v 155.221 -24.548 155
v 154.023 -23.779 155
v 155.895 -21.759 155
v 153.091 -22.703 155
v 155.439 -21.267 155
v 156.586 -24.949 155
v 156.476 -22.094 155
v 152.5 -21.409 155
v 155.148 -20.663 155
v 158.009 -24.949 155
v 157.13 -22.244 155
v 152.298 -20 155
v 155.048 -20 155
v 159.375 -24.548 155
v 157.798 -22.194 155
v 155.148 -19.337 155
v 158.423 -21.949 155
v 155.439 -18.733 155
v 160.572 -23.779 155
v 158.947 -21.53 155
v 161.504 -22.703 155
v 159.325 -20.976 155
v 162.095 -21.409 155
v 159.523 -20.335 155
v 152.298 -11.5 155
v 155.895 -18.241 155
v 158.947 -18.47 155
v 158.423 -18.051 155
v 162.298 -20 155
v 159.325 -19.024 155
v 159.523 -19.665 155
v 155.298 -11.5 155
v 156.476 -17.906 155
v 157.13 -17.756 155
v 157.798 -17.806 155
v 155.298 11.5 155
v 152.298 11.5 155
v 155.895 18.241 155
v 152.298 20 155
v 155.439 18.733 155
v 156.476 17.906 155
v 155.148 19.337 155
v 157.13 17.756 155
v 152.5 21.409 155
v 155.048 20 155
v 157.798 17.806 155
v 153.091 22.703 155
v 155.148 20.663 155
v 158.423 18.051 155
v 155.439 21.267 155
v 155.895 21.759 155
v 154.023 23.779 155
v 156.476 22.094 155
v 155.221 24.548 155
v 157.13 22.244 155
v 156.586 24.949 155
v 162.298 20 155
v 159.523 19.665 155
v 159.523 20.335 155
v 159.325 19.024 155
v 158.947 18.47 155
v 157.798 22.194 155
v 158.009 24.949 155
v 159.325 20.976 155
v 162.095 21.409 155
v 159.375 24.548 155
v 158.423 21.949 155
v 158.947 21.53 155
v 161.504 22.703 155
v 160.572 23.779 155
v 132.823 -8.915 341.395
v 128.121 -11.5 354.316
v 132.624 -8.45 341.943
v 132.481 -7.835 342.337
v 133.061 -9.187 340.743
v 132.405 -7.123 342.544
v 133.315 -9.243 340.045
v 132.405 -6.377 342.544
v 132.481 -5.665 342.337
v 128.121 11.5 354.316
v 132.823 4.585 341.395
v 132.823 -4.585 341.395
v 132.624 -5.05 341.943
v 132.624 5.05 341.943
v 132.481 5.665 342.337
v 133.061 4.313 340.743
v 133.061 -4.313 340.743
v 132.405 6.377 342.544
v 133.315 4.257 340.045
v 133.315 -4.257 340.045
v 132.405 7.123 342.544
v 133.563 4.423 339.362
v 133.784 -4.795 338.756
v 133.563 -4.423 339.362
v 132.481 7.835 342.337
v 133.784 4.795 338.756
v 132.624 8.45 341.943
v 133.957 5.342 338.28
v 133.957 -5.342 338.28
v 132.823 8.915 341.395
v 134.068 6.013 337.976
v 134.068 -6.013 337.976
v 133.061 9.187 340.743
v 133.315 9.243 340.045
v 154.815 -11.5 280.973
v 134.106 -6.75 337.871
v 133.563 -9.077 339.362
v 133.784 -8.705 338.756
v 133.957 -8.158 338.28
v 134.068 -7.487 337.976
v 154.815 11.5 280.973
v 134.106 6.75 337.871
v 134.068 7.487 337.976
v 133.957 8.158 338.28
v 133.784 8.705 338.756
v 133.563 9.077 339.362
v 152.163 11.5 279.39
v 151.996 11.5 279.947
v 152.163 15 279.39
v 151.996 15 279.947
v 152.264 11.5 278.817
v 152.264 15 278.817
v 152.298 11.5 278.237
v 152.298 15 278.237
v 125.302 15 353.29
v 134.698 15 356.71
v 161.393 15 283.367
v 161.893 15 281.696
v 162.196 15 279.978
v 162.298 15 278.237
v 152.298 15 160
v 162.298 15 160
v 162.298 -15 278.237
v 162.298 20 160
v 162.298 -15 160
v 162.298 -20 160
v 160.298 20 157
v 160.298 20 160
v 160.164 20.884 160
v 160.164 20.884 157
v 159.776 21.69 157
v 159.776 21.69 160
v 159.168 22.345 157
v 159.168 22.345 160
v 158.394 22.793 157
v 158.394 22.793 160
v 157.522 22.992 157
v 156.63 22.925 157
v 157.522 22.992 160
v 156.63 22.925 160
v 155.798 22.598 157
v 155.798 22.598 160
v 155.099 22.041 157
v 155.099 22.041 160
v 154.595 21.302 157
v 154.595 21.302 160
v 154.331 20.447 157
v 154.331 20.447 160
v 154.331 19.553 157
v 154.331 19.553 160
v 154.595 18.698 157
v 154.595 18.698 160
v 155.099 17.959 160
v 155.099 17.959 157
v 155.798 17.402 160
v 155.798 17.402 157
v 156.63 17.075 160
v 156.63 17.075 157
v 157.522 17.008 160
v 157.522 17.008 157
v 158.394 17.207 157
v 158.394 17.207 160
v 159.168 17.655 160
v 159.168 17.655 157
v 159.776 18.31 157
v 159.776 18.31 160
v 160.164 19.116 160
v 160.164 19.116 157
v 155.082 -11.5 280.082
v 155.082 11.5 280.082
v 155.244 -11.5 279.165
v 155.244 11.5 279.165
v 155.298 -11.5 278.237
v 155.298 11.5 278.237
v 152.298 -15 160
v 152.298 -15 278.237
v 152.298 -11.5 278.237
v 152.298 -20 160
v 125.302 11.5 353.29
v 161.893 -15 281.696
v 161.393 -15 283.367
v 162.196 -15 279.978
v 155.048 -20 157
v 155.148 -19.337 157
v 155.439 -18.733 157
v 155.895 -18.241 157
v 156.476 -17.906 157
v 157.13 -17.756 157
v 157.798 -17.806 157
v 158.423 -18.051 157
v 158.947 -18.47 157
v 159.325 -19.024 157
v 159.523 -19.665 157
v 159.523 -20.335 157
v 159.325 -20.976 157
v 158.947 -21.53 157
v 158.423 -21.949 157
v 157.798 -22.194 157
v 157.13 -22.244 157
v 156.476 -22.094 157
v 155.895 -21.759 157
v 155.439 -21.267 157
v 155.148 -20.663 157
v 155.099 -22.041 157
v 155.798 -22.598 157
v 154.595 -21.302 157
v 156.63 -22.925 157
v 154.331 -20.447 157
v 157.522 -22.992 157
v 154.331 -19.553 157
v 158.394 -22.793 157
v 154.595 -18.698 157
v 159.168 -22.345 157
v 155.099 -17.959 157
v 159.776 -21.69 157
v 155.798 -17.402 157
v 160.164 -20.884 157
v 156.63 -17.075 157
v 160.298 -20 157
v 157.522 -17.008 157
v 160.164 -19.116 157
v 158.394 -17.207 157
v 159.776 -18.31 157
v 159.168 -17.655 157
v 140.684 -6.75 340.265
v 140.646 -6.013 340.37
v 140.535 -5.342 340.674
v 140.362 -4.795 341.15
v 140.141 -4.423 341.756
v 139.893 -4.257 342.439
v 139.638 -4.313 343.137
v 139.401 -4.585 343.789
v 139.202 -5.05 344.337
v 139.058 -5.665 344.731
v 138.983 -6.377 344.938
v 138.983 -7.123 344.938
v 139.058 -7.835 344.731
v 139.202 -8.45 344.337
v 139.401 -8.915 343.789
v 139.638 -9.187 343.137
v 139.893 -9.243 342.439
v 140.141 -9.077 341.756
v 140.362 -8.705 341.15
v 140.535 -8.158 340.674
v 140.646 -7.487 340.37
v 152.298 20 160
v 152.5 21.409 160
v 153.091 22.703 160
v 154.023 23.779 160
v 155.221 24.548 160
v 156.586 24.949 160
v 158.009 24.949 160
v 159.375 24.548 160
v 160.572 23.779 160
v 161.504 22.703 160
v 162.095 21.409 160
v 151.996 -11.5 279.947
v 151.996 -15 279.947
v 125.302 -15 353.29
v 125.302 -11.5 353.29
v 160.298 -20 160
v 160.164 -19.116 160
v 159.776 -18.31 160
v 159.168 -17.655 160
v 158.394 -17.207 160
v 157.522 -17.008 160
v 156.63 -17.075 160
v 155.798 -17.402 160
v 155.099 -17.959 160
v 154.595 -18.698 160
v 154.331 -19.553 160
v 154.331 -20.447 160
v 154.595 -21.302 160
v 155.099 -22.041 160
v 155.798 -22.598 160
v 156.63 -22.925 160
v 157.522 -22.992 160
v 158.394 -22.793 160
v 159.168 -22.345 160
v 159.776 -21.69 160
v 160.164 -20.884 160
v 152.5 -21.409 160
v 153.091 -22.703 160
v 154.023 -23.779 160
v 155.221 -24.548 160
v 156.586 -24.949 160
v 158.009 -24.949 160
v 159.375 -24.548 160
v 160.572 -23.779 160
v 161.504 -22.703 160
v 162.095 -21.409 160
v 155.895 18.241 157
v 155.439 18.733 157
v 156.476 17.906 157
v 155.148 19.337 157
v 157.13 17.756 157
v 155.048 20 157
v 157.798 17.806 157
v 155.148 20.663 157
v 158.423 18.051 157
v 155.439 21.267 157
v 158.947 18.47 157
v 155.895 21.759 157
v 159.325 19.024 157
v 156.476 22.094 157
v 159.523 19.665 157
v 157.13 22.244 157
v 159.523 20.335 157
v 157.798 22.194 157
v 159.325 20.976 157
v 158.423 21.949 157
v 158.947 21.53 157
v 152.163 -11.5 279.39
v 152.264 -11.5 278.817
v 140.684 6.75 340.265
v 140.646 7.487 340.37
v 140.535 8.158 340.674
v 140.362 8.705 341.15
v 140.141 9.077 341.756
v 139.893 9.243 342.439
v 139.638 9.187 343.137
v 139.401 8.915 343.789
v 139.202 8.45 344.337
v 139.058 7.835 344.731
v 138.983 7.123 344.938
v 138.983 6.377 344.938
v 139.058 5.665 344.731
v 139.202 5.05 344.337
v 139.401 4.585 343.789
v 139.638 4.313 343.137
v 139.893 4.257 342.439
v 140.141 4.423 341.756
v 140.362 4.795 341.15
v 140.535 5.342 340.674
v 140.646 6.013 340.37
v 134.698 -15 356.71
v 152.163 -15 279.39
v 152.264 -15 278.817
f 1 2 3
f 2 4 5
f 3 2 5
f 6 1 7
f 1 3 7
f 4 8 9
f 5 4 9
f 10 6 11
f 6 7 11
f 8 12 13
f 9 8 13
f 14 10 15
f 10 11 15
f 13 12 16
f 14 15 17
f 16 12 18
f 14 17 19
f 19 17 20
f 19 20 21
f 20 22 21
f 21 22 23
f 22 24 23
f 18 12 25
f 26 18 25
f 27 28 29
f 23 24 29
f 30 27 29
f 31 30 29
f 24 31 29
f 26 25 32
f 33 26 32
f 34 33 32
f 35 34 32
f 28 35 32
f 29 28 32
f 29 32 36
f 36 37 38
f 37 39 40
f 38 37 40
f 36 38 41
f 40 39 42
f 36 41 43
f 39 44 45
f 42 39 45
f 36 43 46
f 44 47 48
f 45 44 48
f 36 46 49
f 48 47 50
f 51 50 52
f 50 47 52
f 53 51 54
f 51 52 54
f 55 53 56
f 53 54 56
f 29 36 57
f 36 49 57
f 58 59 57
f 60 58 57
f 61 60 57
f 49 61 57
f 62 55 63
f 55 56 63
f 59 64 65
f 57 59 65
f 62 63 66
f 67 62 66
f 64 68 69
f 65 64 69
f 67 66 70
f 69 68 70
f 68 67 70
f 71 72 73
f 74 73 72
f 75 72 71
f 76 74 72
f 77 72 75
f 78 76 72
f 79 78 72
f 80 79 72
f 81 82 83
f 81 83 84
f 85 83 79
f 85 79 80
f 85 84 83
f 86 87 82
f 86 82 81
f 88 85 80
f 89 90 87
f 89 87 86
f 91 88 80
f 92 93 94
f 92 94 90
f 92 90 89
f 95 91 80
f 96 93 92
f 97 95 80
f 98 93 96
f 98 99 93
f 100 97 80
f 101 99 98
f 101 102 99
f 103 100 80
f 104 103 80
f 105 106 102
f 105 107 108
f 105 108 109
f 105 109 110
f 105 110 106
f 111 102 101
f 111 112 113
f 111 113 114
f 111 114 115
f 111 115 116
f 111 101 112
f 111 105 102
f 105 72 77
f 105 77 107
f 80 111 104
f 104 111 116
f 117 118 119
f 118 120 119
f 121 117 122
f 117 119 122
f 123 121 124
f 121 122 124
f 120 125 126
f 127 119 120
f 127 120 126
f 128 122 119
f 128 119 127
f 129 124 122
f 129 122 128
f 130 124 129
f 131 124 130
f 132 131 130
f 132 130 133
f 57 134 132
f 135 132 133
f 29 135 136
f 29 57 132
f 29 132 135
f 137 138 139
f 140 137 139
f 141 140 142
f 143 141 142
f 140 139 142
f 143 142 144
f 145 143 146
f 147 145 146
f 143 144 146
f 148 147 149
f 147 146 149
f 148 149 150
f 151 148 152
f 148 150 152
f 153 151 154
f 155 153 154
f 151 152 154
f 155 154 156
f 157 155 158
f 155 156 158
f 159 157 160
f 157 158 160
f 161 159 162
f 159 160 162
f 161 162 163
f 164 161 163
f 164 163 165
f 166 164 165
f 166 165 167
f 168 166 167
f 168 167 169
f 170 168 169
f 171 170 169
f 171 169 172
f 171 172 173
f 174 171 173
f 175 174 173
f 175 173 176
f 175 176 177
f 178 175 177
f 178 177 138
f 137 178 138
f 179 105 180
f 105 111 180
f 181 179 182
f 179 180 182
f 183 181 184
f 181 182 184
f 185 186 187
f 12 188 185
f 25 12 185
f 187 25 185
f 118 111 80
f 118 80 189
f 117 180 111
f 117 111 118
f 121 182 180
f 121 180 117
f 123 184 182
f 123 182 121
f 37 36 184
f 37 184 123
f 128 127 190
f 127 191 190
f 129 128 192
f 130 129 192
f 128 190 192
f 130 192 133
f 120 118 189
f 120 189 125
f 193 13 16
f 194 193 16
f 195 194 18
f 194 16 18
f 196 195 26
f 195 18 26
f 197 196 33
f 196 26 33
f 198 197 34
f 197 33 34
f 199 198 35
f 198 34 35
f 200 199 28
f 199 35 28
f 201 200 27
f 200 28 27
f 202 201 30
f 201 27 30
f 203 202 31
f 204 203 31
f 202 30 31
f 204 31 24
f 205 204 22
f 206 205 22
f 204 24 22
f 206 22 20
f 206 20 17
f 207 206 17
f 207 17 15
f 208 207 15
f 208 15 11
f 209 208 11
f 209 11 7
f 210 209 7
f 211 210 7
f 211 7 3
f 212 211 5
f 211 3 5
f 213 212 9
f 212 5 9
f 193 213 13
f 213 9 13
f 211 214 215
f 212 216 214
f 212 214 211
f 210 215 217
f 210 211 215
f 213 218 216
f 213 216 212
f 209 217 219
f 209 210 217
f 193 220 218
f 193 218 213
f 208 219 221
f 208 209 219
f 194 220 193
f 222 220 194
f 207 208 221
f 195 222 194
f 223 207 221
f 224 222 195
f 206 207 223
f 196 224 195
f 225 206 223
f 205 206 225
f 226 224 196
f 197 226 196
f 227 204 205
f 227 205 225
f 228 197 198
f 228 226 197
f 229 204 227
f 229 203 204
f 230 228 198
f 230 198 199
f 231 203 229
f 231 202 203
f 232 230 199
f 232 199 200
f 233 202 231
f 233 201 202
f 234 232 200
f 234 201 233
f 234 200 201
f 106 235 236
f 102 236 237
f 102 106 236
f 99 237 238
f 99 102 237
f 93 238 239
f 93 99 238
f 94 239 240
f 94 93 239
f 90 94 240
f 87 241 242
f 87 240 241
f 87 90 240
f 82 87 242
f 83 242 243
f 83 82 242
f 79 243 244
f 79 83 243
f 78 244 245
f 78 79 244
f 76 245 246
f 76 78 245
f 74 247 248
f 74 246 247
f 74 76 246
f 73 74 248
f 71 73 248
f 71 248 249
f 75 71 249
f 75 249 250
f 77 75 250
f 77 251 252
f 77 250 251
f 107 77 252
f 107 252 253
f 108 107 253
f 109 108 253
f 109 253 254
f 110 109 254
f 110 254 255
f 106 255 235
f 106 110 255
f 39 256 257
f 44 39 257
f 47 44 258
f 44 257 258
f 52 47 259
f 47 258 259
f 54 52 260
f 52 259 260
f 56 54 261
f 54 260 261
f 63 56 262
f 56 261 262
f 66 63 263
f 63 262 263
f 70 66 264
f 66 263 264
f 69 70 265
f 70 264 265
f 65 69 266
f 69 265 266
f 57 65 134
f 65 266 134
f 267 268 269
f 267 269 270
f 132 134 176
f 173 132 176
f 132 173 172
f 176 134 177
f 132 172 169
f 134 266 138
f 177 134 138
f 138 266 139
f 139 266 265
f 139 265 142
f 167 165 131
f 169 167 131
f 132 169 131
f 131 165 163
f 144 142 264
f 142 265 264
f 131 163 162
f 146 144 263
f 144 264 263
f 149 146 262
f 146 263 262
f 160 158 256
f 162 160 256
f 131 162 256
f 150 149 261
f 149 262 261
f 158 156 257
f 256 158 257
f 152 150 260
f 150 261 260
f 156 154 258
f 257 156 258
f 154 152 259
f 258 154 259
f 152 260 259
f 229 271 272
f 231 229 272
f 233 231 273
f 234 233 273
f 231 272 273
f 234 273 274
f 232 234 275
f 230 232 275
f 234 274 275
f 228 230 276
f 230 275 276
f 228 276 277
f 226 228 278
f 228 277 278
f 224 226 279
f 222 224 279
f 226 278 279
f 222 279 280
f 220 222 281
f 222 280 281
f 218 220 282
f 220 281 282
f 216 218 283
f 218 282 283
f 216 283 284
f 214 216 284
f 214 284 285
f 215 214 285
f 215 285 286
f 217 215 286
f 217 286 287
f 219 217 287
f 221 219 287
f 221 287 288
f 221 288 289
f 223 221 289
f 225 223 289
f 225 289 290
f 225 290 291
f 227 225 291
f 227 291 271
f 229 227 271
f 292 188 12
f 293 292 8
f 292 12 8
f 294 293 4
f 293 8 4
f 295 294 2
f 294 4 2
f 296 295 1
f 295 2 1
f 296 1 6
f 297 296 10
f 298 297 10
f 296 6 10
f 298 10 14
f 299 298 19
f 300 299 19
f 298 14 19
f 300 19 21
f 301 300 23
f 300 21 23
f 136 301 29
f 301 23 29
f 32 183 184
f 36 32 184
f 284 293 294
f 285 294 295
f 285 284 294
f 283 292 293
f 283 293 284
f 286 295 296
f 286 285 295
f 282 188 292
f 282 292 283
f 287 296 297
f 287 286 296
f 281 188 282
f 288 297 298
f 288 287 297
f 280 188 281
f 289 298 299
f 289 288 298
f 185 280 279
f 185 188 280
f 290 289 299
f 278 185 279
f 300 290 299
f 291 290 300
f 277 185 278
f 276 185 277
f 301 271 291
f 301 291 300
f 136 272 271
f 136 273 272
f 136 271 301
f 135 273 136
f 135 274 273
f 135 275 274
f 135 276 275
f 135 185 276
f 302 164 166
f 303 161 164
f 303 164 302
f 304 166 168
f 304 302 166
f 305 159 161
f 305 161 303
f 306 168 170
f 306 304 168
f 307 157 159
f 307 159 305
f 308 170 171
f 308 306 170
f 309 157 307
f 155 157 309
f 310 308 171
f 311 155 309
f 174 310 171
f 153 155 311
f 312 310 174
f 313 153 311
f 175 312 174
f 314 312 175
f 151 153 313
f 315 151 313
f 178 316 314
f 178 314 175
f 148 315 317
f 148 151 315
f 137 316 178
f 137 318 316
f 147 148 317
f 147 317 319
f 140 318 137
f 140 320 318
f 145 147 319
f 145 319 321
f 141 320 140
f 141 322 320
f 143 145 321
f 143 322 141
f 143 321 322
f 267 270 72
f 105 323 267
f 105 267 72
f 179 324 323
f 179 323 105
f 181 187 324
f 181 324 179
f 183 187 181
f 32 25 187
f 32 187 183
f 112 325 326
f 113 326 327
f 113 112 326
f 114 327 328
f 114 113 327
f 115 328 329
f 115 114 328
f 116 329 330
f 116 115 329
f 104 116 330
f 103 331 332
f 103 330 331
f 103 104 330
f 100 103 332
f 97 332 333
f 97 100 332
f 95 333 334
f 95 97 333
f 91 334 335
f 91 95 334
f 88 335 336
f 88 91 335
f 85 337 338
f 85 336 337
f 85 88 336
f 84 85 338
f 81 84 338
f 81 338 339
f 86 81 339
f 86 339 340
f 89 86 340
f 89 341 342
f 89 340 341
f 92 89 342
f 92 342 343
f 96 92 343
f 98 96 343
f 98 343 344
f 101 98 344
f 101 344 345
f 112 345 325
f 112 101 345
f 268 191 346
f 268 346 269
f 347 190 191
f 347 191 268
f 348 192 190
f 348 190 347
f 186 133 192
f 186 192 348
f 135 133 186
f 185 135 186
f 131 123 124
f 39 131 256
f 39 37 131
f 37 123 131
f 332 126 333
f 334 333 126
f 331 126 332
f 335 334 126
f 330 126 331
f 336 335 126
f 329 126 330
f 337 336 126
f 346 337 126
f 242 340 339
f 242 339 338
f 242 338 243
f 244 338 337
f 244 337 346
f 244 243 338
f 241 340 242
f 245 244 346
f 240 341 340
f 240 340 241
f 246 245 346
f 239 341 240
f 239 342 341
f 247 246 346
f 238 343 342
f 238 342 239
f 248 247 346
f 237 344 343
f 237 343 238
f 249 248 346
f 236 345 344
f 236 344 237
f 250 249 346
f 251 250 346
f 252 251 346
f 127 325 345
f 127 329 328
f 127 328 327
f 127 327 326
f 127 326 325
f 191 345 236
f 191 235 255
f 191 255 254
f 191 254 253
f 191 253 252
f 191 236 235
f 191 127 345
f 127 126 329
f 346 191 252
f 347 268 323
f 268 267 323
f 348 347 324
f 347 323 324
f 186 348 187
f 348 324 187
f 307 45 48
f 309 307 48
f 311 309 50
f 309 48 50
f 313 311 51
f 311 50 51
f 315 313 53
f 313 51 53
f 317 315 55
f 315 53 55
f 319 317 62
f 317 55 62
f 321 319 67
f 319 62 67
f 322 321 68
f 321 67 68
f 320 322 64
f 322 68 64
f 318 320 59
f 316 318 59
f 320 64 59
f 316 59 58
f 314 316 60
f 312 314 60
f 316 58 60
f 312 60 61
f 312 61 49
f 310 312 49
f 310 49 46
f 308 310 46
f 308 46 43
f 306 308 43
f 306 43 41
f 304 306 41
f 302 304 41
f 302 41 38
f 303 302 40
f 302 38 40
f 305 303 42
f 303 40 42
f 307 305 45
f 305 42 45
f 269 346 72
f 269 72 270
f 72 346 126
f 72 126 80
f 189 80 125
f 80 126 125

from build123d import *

# Parameters (mm, degrees)
SKETCH_1_R                = 115
SKETCH_1_R_2              = 105
EXTRUDE_1_DEPTH           = 5
SKETCH_4_R                = 2.5
CUT_EXTRUDE_1_DEPTH       = 33.934862746
EXTRUDE_2_DEPTH           = 5
HOLE_WIZARD_1_D           = 4.5
HOLE_WIZARD_1_CBORE_D     = 6
HOLE_WIZARD_1_CBORE_DEPTH = 3
SKETCH_9_R                = 2.25
SKETCH_9_R_2              = 1.9
EXTRUDE_3_DEPTH           = 5
EXTRUDE_4_DEPTH           = 5
HOLE_WIZARD_2_D           = 4.5
HOLE_WIZARD_2_CBORE_D     = 6
HOLE_WIZARD_2_CBORE_DEPTH = 3
SKETCH_13_R               = 2.25
SKETCH_13_R_2             = 1.9
EXTRUDE_5_DEPTH           = 5
SKETCH_14_W               = 562.038590931
SKETCH_14_H               = 462.09177453
CUT_EXTRUDE_4_DEPTH       = 163.29776757
SKETCH_15_W               = 480.927145246
SKETCH_15_H               = 274.608213656
CUT_EXTRUDE_5_DEPTH       = 161


with BuildPart() as part:
    # 草图1 → 凸台-拉伸1 (new body, symmetric)
    with BuildSketch(Plane.XY):
        Circle(SKETCH_1_R)
        Circle(SKETCH_1_R_2, mode=Mode.SUBTRACT)
    extrude(amount=EXTRUDE_1_DEPTH, both=True)

    # 扫描1: sweep along a path in 草图2
    with BuildLine(Plane(origin=(0, 0, 0), x_dir=(1, 0, 0), z_dir=(0, 1, 0))) as sweep_1_path:
        Line((-130, -355), (-156.694693778, -281.656931626))
        ThreePointArc((-156.694693778, -281.656931626), (-157.1458451, -279.97321197), (-157.29776757, -278.236730193))
        Line((-157.29776757, -278.236730193), (-157.29776757, -10))
        ThreePointArc((-157.29776757, -10), (-154.368835382, -2.928932188), (-147.29776757, 0))
        Line((-147.29776757, 0), (-115, 0))
        Line((-115, 0), (-106.681302201, 0))
    # 草图3 → 扫描1 (sweep)
    with BuildSketch(Plane(origin=(-130, 0, 355), x_dir=(0.939692621, 0, -0.342020143), z_dir=(0.342020143, 0, 0.939692621))):
        Polygon((-5, -15), (5, -15), (5, -11.5), (2, -11.5), (2, 11.5), (5, 11.5), (5, 15), (-5, 15), align=None)
    sweep_1 = sweep(path=sweep_1_path.line)

    # 草图4 → 切除-拉伸1 (cut, through all)
    with BuildSketch(Plane(origin=(-227.008304281, 0, 82.624265689), x_dir=(-0.342020143, 0, -0.939692621), z_dir=(0.939692621, 0, -0.342020143))):
        with Locations((-274.128261747, 6.75)):
            Circle(SKETCH_4_R)
        with Locations((-274.128261747, -6.75)):
            Circle(SKETCH_4_R)
    cut_extrude_1 = extrude(amount=-CUT_EXTRUDE_1_DEPTH, mode=Mode.SUBTRACT)

    # 镜向1: 扫描1, 切除-拉伸1 across plane
    add(sweep_1.mirror(Plane(origin=(0, 0, 0), x_dir=(0, 0, 1), z_dir=(1, 0, 0))))
    add(cut_extrude_1.mirror(Plane(origin=(0, 0, 0), x_dir=(0, 0, 1), z_dir=(1, 0, 0))), mode=Mode.SUBTRACT)

    # 草图6 → 凸台-拉伸2 (add, symmetric)
    with BuildSketch(Plane(origin=(0, 0, 0), x_dir=(0, 0, -1), z_dir=(1, 0, 0))):
        with BuildLine():
            Line((-5, 115), (-5, 125))
            ThreePointArc((-5, 125), (0, 130), (5, 125))
            Line((5, 125), (5, 115))
            Line((5, 115), (5, 112.136445143))
            Line((5, 112.136445143), (-5, 112.136445143))
            Line((-5, 112.136445143), (-5, 115))
        make_face()
    extrude_2 = extrude(amount=EXTRUDE_2_DEPTH, both=True)

    # 镜向2: 凸台-拉伸2 across plane
    add(extrude_2.mirror(Plane.ZX))

    # 孔1 (through all)
    with Locations(Plane(origin=(5, 0, 0), x_dir=(0, 0, -1), z_dir=(1, 0, 0))):
        with Locations((0, 124.156343107), (0, -125)):
            CounterBoreHole(HOLE_WIZARD_1_D / 2, HOLE_WIZARD_1_CBORE_D / 2, HOLE_WIZARD_1_CBORE_DEPTH)

    # 草图9 → 凸台-拉伸3 (add)
    with BuildSketch(Plane.ZY.offset(5)):
        with Locations((0, 124.156343107)):
            Circle(SKETCH_9_R)
        with Locations((0, 124.156343107)):
            Circle(SKETCH_9_R_2, mode=Mode.SUBTRACT)
        with Locations((0, -125)):
            Circle(SKETCH_9_R)
        with Locations((0, -125)):
            Circle(SKETCH_9_R_2, mode=Mode.SUBTRACT)
    extrude(amount=-EXTRUDE_3_DEPTH)

    # 草图10 → 凸台-拉伸4 (add, symmetric)
    with BuildSketch(Plane.XY.offset(155)):
        with BuildLine():
            Line((-162.29776757, 15), (-152.29776757, 15))
            Line((-152.29776757, 15), (-152.29776757, 20))
            ThreePointArc((-152.29776757, 20), (-157.29776757, 25), (-162.29776757, 20))
            Line((-162.29776757, 20), (-162.29776757, 15))
        make_face()
        with BuildLine():
            Line((-152.29776757, -15), (-152.29776757, -20))
            ThreePointArc((-152.29776757, -20), (-157.29776757, -25), (-162.29776757, -20))
            Line((-162.29776757, -20), (-162.29776757, -15))
            Line((-162.29776757, -15), (-152.29776757, -15))
        make_face()
        with BuildLine():
            Line((162.29776757, -15), (152.29776757, -15))
            Line((152.29776757, -15), (152.29776757, -20))
            ThreePointArc((152.29776757, -20), (157.29776757, -25), (162.29776757, -20))
            Line((162.29776757, -20), (162.29776757, -15))
        make_face()
        with BuildLine():
            Line((152.29776757, 15), (152.29776757, 20))
            ThreePointArc((152.29776757, 20), (157.29776757, 25), (162.29776757, 20))
            Line((162.29776757, 20), (162.29776757, 15))
            Line((162.29776757, 15), (152.29776757, 15))
        make_face()
    extrude(amount=EXTRUDE_4_DEPTH, both=True)

    # 孔2 (through all)
    with Locations(Plane.XY.offset(160)):
        with Locations((-157.29776757, 20), (-157.29776757, -20), (157.29776757, 20), (157.29776757, -20)):
            CounterBoreHole(HOLE_WIZARD_2_D / 2, HOLE_WIZARD_2_CBORE_D / 2, HOLE_WIZARD_2_CBORE_DEPTH)

    # 草图13 → 凸台-拉伸5 (add)
    with BuildSketch(Plane(origin=(0, 0, 150), x_dir=(-1, 0, 0), z_dir=(0, 0, -1))):
        with Locations((-157.29776757, 20)):
            Circle(SKETCH_13_R)
        with Locations((-157.29776757, 20)):
            Circle(SKETCH_13_R_2, mode=Mode.SUBTRACT)
        with Locations((-157.29776757, -20)):
            Circle(SKETCH_13_R)
        with Locations((-157.29776757, -20)):
            Circle(SKETCH_13_R_2, mode=Mode.SUBTRACT)
        with Locations((157.29776757, -20)):
            Circle(SKETCH_13_R)
        with Locations((157.29776757, -20)):
            Circle(SKETCH_13_R_2, mode=Mode.SUBTRACT)
        with Locations((157.29776757, 20)):
            Circle(SKETCH_13_R)
        with Locations((157.29776757, 20)):
            Circle(SKETCH_13_R_2, mode=Mode.SUBTRACT)
    extrude(amount=-EXTRUDE_5_DEPTH)

    # 草图14 → 切除-拉伸4 (cut, through all)
    with BuildSketch(Plane(origin=(0, 0, 0), x_dir=(0, 0, -1), z_dir=(1, 0, 0))):
        with Locations((-153.139864812, -31.152254463)):
            Rectangle(SKETCH_14_W, SKETCH_14_H)
    extrude(amount=-CUT_EXTRUDE_4_DEPTH, mode=Mode.SUBTRACT)

    # 草图15 → 切除-拉伸5 (cut, through all)
    with BuildSketch(Plane.XY.offset(155)):
        Rectangle(SKETCH_15_W, SKETCH_15_H)
    extrude(amount=-CUT_EXTRUDE_5_DEPTH, mode=Mode.SUBTRACT)


solid = part.part
